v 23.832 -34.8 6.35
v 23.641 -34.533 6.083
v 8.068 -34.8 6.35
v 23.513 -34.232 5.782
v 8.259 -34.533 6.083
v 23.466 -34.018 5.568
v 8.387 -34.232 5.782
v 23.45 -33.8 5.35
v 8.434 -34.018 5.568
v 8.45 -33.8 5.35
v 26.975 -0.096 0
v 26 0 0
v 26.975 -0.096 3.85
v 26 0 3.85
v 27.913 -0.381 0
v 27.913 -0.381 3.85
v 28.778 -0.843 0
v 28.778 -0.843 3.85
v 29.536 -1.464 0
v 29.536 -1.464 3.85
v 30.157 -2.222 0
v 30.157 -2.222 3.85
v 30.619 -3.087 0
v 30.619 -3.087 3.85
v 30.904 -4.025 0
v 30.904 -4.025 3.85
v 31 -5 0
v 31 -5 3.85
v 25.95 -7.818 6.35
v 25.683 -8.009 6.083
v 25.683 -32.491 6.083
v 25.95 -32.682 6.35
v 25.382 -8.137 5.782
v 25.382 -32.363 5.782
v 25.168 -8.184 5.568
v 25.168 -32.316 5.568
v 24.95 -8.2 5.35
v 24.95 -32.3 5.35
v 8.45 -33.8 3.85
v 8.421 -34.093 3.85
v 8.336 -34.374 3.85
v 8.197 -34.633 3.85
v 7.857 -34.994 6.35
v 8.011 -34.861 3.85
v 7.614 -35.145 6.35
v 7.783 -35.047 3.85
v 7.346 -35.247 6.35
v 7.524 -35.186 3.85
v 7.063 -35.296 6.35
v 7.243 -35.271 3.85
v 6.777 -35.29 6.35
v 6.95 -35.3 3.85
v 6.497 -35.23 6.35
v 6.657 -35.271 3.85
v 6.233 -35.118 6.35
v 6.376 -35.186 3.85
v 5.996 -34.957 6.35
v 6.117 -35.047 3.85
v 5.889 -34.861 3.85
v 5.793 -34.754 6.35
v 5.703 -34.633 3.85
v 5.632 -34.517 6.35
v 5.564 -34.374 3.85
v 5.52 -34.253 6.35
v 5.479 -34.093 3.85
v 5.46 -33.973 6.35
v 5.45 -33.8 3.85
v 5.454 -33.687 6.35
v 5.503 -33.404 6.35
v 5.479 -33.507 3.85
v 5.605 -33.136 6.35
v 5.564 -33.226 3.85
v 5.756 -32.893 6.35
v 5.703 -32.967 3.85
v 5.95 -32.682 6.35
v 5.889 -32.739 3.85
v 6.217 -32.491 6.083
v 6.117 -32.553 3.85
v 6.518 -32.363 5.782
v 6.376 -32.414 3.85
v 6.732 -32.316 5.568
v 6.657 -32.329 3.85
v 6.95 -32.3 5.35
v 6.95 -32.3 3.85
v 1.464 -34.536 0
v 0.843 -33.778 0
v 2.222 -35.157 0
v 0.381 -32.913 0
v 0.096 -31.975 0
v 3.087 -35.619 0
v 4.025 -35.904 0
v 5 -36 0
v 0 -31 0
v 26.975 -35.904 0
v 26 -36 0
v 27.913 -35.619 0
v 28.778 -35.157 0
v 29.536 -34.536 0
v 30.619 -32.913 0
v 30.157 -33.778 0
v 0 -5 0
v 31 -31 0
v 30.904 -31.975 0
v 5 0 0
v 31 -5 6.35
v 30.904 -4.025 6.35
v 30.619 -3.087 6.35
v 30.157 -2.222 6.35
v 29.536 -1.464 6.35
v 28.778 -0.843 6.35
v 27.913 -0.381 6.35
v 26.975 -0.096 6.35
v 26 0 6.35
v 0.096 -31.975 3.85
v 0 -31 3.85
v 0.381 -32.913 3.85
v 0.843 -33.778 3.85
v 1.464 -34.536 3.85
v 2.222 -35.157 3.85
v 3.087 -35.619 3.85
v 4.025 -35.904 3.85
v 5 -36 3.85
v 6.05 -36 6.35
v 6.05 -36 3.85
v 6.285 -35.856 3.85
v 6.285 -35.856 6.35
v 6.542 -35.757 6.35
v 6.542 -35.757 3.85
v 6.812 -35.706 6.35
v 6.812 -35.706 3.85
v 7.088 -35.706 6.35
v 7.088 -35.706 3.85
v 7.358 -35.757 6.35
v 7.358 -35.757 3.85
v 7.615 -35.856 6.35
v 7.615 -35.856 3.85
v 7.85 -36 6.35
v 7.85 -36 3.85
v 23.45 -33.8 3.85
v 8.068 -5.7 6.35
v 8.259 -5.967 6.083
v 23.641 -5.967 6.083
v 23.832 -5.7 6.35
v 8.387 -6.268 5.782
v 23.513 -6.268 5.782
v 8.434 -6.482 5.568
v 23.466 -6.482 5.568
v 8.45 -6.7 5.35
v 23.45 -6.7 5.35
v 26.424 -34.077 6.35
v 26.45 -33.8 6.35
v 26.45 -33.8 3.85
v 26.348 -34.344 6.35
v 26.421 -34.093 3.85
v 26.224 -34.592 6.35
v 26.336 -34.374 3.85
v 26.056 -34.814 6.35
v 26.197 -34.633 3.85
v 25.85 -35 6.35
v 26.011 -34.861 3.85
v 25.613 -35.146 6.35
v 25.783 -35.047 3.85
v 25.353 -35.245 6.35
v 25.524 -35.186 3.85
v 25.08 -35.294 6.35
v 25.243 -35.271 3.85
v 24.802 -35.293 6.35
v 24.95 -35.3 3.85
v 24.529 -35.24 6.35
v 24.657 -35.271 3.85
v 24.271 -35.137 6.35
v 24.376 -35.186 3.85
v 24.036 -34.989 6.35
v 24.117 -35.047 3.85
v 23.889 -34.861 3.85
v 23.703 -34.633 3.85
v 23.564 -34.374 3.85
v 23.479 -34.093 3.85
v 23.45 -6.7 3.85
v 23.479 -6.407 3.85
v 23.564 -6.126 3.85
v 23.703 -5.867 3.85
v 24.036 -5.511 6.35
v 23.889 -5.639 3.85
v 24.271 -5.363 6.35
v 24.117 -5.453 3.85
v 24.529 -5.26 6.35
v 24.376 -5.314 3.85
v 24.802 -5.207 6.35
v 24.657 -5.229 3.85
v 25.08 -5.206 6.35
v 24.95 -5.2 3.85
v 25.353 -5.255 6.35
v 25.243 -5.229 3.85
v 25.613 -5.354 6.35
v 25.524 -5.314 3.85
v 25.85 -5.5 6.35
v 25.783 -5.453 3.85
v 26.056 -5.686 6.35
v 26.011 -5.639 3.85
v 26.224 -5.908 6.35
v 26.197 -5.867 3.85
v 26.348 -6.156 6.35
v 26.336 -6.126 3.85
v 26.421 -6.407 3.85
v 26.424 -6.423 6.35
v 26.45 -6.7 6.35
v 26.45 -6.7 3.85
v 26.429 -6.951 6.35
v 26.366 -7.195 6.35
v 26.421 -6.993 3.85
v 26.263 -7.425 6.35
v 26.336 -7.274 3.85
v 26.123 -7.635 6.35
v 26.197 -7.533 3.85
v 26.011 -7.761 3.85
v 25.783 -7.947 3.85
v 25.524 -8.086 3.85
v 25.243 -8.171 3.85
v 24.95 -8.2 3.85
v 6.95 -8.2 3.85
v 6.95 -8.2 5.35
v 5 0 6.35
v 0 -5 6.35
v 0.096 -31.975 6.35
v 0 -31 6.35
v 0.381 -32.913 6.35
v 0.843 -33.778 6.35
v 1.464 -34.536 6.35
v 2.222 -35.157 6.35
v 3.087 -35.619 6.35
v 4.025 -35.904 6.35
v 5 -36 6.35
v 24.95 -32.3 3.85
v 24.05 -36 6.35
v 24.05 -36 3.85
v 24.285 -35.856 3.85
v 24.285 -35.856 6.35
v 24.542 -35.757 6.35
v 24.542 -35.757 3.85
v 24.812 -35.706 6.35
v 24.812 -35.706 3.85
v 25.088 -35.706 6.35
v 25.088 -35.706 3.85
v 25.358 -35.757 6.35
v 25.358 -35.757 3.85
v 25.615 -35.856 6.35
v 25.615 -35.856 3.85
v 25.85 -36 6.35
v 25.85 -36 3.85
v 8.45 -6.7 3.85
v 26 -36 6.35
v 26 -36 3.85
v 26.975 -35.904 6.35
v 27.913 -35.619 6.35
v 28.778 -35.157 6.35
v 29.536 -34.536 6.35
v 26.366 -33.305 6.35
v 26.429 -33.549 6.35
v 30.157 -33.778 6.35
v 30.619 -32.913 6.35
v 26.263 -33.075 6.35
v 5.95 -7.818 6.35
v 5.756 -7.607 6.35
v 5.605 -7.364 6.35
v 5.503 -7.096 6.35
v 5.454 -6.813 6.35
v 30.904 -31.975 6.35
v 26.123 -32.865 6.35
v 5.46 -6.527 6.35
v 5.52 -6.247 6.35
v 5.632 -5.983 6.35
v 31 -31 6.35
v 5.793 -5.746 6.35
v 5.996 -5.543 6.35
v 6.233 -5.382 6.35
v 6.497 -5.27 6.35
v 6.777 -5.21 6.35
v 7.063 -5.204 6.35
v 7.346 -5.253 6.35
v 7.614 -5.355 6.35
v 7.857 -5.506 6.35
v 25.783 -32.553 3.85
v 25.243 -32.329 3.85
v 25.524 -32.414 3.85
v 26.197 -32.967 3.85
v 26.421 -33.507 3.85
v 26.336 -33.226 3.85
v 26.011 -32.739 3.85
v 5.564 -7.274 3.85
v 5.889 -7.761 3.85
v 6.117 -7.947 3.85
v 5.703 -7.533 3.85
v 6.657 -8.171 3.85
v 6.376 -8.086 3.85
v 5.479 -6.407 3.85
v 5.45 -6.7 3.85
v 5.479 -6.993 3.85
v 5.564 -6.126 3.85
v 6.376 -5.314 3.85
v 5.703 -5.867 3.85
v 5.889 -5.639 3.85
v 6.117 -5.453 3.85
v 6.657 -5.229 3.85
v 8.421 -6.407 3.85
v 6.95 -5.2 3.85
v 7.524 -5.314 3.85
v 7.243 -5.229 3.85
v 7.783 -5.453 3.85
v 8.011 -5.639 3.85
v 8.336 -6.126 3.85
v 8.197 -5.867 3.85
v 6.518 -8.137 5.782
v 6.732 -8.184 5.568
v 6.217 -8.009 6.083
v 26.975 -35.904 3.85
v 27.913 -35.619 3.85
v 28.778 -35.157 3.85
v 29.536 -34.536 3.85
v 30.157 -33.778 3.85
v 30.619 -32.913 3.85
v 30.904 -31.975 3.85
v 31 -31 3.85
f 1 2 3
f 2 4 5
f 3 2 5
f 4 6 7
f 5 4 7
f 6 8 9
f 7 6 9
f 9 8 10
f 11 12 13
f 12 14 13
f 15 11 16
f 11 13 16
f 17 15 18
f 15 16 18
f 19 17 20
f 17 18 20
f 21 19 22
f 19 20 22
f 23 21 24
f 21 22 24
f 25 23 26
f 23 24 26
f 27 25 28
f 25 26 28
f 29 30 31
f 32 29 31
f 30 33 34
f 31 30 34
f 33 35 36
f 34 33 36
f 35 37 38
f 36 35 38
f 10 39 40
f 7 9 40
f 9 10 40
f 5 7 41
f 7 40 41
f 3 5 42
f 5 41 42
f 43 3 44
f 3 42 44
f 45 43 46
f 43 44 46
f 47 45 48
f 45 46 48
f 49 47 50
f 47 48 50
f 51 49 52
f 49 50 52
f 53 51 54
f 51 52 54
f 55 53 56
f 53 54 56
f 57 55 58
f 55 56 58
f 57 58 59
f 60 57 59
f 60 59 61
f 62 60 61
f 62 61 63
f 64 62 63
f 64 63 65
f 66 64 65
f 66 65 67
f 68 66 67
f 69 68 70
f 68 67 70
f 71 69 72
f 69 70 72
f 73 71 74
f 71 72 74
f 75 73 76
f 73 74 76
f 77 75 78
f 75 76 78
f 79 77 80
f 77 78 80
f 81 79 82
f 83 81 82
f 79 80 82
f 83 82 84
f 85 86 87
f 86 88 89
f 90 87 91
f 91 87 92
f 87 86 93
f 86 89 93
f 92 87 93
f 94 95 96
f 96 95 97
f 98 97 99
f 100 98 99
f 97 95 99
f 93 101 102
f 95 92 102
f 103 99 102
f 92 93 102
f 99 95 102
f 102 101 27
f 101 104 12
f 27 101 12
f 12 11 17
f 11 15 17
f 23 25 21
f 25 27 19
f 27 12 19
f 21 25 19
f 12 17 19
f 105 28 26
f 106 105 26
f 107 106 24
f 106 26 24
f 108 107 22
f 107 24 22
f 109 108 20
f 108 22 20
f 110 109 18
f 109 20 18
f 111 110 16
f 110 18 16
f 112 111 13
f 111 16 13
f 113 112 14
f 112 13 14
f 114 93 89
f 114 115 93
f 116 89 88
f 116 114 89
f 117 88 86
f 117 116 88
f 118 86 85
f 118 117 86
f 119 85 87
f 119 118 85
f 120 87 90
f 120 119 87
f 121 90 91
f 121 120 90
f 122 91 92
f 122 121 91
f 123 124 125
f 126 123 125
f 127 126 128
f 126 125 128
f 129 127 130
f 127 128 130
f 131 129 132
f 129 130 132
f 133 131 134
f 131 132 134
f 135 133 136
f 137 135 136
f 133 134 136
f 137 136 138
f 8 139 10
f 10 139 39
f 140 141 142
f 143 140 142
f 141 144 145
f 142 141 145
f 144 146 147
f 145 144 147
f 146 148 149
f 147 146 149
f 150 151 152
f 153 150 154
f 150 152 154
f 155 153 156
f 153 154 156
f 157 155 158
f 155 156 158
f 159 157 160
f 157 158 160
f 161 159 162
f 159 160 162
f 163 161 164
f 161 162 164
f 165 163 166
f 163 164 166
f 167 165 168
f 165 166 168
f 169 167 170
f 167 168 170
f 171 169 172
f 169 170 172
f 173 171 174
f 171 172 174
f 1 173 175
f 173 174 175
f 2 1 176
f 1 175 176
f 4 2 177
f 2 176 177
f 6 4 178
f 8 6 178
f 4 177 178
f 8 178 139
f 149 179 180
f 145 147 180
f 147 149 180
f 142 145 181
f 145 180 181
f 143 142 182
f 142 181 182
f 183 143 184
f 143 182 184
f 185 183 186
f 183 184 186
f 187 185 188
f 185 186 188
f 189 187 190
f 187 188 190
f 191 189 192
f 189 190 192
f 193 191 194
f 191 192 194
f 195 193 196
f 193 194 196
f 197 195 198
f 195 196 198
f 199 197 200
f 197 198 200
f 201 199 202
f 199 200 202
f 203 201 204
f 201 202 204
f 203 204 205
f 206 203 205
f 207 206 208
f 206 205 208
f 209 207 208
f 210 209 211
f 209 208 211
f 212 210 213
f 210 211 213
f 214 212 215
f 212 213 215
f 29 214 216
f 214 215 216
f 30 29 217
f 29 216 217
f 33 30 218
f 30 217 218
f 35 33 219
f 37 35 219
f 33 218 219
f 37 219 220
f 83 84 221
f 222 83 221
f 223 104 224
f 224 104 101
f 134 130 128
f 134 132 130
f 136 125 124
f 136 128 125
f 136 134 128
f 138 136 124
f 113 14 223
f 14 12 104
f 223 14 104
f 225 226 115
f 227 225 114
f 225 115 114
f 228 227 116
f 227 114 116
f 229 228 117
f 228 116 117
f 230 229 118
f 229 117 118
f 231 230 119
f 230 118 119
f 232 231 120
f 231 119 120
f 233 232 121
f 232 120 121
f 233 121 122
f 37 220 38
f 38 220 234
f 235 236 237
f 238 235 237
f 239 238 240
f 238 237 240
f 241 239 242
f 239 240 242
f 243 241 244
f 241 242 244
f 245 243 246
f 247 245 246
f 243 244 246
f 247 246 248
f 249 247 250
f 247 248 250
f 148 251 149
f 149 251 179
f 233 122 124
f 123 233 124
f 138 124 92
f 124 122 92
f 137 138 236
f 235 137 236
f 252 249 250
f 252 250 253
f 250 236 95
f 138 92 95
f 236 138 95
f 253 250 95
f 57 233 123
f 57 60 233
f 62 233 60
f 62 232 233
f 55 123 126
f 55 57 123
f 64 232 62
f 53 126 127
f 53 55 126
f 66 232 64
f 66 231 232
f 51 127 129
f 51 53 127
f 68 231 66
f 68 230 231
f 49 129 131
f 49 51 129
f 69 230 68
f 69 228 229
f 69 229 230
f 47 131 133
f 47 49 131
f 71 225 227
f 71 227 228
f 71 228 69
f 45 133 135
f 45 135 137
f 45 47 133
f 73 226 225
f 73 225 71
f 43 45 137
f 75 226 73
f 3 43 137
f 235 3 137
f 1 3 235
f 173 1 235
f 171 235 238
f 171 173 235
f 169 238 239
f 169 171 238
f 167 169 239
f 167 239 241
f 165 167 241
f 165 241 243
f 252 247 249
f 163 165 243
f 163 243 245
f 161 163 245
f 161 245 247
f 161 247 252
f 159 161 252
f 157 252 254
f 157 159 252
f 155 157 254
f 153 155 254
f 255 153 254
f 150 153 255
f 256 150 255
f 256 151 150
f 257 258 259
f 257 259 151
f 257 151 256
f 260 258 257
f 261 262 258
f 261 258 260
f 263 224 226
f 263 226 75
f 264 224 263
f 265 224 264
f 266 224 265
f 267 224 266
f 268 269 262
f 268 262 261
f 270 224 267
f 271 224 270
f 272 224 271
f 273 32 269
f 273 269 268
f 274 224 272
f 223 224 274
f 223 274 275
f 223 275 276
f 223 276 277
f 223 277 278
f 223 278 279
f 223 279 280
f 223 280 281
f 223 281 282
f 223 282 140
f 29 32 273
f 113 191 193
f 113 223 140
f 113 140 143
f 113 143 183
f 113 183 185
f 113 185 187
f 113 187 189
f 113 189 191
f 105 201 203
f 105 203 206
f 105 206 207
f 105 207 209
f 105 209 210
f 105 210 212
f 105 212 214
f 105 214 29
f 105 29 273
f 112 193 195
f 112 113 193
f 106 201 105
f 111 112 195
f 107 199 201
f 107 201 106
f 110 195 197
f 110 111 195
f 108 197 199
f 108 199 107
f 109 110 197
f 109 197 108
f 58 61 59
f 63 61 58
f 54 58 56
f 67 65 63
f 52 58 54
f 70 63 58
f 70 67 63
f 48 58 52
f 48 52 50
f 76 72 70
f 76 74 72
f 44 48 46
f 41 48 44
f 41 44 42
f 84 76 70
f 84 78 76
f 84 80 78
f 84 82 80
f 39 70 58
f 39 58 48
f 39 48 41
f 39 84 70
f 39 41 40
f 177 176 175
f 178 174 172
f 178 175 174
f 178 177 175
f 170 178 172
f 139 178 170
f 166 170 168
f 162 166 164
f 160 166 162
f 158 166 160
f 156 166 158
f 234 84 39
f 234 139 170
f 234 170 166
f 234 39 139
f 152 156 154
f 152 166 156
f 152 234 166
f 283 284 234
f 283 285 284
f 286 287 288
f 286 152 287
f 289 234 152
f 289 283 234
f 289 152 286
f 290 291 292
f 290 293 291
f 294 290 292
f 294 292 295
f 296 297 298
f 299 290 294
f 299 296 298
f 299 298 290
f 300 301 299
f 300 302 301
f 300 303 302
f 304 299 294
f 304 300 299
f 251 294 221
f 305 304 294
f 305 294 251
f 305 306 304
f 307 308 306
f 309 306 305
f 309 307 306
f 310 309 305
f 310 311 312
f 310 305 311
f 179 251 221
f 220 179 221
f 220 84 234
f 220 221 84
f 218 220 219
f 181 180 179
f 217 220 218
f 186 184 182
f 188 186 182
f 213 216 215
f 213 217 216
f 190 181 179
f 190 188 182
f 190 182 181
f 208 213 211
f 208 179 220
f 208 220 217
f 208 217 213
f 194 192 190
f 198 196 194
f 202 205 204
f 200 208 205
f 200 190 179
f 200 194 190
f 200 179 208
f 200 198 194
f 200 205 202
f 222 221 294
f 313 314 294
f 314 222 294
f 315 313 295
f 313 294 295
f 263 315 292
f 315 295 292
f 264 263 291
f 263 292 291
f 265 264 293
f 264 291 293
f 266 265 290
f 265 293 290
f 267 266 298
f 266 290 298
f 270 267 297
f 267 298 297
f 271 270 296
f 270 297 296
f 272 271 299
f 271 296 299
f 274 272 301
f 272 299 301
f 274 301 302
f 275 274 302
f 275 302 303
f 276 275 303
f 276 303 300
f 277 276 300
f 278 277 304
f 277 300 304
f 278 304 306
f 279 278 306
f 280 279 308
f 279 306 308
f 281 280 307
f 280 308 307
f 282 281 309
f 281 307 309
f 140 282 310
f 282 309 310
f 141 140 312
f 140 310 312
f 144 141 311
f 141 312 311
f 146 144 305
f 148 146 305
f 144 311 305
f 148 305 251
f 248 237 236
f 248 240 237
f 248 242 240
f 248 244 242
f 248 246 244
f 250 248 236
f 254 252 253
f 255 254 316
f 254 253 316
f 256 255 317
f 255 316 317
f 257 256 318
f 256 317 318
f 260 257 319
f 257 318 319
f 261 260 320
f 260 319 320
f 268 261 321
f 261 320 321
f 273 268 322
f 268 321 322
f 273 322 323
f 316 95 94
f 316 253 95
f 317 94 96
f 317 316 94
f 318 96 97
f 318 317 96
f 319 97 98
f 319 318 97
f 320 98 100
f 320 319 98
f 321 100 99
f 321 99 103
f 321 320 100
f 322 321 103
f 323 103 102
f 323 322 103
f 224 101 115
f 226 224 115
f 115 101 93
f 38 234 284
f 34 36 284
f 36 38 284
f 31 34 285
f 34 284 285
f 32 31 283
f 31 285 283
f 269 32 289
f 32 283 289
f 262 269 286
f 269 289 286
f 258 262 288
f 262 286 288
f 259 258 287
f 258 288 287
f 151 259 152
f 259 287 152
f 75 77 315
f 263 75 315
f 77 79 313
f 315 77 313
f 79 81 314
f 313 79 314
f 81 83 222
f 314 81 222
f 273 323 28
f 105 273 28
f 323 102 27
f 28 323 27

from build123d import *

# Parameters (mm, degrees)
F0_W     = 31
F0_H     = 36
F1_DEPTH = 3.85
F2_SIZE2 = 5
F2_SIZE  = 5
F3_R     = 5
F5_DEPTH = 2.5
F6_SIZE  = 1


with BuildPart() as f1:
    # F0 (on Top) → F1 (new body)
    with BuildSketch(Plane.XY):
        with Locations((15.5, -18)):
            Rectangle(F0_W, F0_H)
    extrude(amount=F1_DEPTH)

    # F2
    f2_edges = [f1.edges().sort_by_distance(p)[0] for p in [
        (0, 0, 1.925),
    ]]
    chamfer(f2_edges, length=F2_SIZE, length2=F2_SIZE2)

    # F3
    f3_edges = [f1.edges().sort_by_distance(p)[0] for p in [
        (31, 0, 1.925),
        (31, -36, 1.925),
        (0, -36, 1.925),
    ]]
    fillet(f3_edges, radius=F3_R)

    # F4 (on face) → F5 (join)
    with BuildSketch(Plane.XY.offset(3.85)):
        with BuildLine():
            Line((5, -36), (6.05, -36))
            ThreePointArc((6.05, -36), (6.95, -35.7), (7.85, -36))
            Line((7.85, -36), (24.05, -36))
            ThreePointArc((24.05, -36), (24.95, -35.7), (25.85, -36))
            Line((25.85, -36), (26, -36))
            ThreePointArc((26, -36), (29.5355339059, -34.5355339059), (31, -31))
            Line((31, -31), (31, -5))
            ThreePointArc((31, -5), (29.5355339059, -1.4644660941), (26, 0))
            Line((26, 0), (5, 0))
            Line((5, 0), (0, -5))
            Line((0, -5), (0, -31))
            ThreePointArc((0, -31), (1.4644660941, -34.5355339059), (5, -36))
        make_face()
        with BuildLine():
            Line((23.45, -33.8), (8.45, -33.8))
            ThreePointArc((8.45, -33.8), (5.8893398282, -34.8606601718), (6.95, -32.3))
            Line((6.95, -32.3), (6.95, -8.2))
            ThreePointArc((6.95, -8.2), (5.8893398282, -5.6393398282), (8.45, -6.7))
            Line((8.45, -6.7), (23.45, -6.7))
            ThreePointArc((23.45, -6.7), (24.95, -5.2), (26.45, -6.7))
            ThreePointArc((26.45, -6.7), (26.0106601718, -7.7606601718), (24.95, -8.2))
            Line((24.95, -8.2), (24.95, -32.3))
            ThreePointArc((24.95, -32.3), (26.0106601718, -32.7393398282), (26.45, -33.8))
            ThreePointArc((26.45, -33.8), (24.95, -35.3), (23.45, -33.8))
        make_face(mode=Mode.SUBTRACT)
    extrude(amount=F5_DEPTH)

    # F6
    f6_edges = [f1.edges().sort_by_distance(p)[0] for p in [
        (6.95, -20.25, 6.35),
        (15.95, -6.7, 6.35),
        (24.95, -20.25, 6.35),
        (15.95, -33.8, 6.35),
    ]]
    chamfer(f6_edges, length=F6_SIZE)


solid = f1.part
